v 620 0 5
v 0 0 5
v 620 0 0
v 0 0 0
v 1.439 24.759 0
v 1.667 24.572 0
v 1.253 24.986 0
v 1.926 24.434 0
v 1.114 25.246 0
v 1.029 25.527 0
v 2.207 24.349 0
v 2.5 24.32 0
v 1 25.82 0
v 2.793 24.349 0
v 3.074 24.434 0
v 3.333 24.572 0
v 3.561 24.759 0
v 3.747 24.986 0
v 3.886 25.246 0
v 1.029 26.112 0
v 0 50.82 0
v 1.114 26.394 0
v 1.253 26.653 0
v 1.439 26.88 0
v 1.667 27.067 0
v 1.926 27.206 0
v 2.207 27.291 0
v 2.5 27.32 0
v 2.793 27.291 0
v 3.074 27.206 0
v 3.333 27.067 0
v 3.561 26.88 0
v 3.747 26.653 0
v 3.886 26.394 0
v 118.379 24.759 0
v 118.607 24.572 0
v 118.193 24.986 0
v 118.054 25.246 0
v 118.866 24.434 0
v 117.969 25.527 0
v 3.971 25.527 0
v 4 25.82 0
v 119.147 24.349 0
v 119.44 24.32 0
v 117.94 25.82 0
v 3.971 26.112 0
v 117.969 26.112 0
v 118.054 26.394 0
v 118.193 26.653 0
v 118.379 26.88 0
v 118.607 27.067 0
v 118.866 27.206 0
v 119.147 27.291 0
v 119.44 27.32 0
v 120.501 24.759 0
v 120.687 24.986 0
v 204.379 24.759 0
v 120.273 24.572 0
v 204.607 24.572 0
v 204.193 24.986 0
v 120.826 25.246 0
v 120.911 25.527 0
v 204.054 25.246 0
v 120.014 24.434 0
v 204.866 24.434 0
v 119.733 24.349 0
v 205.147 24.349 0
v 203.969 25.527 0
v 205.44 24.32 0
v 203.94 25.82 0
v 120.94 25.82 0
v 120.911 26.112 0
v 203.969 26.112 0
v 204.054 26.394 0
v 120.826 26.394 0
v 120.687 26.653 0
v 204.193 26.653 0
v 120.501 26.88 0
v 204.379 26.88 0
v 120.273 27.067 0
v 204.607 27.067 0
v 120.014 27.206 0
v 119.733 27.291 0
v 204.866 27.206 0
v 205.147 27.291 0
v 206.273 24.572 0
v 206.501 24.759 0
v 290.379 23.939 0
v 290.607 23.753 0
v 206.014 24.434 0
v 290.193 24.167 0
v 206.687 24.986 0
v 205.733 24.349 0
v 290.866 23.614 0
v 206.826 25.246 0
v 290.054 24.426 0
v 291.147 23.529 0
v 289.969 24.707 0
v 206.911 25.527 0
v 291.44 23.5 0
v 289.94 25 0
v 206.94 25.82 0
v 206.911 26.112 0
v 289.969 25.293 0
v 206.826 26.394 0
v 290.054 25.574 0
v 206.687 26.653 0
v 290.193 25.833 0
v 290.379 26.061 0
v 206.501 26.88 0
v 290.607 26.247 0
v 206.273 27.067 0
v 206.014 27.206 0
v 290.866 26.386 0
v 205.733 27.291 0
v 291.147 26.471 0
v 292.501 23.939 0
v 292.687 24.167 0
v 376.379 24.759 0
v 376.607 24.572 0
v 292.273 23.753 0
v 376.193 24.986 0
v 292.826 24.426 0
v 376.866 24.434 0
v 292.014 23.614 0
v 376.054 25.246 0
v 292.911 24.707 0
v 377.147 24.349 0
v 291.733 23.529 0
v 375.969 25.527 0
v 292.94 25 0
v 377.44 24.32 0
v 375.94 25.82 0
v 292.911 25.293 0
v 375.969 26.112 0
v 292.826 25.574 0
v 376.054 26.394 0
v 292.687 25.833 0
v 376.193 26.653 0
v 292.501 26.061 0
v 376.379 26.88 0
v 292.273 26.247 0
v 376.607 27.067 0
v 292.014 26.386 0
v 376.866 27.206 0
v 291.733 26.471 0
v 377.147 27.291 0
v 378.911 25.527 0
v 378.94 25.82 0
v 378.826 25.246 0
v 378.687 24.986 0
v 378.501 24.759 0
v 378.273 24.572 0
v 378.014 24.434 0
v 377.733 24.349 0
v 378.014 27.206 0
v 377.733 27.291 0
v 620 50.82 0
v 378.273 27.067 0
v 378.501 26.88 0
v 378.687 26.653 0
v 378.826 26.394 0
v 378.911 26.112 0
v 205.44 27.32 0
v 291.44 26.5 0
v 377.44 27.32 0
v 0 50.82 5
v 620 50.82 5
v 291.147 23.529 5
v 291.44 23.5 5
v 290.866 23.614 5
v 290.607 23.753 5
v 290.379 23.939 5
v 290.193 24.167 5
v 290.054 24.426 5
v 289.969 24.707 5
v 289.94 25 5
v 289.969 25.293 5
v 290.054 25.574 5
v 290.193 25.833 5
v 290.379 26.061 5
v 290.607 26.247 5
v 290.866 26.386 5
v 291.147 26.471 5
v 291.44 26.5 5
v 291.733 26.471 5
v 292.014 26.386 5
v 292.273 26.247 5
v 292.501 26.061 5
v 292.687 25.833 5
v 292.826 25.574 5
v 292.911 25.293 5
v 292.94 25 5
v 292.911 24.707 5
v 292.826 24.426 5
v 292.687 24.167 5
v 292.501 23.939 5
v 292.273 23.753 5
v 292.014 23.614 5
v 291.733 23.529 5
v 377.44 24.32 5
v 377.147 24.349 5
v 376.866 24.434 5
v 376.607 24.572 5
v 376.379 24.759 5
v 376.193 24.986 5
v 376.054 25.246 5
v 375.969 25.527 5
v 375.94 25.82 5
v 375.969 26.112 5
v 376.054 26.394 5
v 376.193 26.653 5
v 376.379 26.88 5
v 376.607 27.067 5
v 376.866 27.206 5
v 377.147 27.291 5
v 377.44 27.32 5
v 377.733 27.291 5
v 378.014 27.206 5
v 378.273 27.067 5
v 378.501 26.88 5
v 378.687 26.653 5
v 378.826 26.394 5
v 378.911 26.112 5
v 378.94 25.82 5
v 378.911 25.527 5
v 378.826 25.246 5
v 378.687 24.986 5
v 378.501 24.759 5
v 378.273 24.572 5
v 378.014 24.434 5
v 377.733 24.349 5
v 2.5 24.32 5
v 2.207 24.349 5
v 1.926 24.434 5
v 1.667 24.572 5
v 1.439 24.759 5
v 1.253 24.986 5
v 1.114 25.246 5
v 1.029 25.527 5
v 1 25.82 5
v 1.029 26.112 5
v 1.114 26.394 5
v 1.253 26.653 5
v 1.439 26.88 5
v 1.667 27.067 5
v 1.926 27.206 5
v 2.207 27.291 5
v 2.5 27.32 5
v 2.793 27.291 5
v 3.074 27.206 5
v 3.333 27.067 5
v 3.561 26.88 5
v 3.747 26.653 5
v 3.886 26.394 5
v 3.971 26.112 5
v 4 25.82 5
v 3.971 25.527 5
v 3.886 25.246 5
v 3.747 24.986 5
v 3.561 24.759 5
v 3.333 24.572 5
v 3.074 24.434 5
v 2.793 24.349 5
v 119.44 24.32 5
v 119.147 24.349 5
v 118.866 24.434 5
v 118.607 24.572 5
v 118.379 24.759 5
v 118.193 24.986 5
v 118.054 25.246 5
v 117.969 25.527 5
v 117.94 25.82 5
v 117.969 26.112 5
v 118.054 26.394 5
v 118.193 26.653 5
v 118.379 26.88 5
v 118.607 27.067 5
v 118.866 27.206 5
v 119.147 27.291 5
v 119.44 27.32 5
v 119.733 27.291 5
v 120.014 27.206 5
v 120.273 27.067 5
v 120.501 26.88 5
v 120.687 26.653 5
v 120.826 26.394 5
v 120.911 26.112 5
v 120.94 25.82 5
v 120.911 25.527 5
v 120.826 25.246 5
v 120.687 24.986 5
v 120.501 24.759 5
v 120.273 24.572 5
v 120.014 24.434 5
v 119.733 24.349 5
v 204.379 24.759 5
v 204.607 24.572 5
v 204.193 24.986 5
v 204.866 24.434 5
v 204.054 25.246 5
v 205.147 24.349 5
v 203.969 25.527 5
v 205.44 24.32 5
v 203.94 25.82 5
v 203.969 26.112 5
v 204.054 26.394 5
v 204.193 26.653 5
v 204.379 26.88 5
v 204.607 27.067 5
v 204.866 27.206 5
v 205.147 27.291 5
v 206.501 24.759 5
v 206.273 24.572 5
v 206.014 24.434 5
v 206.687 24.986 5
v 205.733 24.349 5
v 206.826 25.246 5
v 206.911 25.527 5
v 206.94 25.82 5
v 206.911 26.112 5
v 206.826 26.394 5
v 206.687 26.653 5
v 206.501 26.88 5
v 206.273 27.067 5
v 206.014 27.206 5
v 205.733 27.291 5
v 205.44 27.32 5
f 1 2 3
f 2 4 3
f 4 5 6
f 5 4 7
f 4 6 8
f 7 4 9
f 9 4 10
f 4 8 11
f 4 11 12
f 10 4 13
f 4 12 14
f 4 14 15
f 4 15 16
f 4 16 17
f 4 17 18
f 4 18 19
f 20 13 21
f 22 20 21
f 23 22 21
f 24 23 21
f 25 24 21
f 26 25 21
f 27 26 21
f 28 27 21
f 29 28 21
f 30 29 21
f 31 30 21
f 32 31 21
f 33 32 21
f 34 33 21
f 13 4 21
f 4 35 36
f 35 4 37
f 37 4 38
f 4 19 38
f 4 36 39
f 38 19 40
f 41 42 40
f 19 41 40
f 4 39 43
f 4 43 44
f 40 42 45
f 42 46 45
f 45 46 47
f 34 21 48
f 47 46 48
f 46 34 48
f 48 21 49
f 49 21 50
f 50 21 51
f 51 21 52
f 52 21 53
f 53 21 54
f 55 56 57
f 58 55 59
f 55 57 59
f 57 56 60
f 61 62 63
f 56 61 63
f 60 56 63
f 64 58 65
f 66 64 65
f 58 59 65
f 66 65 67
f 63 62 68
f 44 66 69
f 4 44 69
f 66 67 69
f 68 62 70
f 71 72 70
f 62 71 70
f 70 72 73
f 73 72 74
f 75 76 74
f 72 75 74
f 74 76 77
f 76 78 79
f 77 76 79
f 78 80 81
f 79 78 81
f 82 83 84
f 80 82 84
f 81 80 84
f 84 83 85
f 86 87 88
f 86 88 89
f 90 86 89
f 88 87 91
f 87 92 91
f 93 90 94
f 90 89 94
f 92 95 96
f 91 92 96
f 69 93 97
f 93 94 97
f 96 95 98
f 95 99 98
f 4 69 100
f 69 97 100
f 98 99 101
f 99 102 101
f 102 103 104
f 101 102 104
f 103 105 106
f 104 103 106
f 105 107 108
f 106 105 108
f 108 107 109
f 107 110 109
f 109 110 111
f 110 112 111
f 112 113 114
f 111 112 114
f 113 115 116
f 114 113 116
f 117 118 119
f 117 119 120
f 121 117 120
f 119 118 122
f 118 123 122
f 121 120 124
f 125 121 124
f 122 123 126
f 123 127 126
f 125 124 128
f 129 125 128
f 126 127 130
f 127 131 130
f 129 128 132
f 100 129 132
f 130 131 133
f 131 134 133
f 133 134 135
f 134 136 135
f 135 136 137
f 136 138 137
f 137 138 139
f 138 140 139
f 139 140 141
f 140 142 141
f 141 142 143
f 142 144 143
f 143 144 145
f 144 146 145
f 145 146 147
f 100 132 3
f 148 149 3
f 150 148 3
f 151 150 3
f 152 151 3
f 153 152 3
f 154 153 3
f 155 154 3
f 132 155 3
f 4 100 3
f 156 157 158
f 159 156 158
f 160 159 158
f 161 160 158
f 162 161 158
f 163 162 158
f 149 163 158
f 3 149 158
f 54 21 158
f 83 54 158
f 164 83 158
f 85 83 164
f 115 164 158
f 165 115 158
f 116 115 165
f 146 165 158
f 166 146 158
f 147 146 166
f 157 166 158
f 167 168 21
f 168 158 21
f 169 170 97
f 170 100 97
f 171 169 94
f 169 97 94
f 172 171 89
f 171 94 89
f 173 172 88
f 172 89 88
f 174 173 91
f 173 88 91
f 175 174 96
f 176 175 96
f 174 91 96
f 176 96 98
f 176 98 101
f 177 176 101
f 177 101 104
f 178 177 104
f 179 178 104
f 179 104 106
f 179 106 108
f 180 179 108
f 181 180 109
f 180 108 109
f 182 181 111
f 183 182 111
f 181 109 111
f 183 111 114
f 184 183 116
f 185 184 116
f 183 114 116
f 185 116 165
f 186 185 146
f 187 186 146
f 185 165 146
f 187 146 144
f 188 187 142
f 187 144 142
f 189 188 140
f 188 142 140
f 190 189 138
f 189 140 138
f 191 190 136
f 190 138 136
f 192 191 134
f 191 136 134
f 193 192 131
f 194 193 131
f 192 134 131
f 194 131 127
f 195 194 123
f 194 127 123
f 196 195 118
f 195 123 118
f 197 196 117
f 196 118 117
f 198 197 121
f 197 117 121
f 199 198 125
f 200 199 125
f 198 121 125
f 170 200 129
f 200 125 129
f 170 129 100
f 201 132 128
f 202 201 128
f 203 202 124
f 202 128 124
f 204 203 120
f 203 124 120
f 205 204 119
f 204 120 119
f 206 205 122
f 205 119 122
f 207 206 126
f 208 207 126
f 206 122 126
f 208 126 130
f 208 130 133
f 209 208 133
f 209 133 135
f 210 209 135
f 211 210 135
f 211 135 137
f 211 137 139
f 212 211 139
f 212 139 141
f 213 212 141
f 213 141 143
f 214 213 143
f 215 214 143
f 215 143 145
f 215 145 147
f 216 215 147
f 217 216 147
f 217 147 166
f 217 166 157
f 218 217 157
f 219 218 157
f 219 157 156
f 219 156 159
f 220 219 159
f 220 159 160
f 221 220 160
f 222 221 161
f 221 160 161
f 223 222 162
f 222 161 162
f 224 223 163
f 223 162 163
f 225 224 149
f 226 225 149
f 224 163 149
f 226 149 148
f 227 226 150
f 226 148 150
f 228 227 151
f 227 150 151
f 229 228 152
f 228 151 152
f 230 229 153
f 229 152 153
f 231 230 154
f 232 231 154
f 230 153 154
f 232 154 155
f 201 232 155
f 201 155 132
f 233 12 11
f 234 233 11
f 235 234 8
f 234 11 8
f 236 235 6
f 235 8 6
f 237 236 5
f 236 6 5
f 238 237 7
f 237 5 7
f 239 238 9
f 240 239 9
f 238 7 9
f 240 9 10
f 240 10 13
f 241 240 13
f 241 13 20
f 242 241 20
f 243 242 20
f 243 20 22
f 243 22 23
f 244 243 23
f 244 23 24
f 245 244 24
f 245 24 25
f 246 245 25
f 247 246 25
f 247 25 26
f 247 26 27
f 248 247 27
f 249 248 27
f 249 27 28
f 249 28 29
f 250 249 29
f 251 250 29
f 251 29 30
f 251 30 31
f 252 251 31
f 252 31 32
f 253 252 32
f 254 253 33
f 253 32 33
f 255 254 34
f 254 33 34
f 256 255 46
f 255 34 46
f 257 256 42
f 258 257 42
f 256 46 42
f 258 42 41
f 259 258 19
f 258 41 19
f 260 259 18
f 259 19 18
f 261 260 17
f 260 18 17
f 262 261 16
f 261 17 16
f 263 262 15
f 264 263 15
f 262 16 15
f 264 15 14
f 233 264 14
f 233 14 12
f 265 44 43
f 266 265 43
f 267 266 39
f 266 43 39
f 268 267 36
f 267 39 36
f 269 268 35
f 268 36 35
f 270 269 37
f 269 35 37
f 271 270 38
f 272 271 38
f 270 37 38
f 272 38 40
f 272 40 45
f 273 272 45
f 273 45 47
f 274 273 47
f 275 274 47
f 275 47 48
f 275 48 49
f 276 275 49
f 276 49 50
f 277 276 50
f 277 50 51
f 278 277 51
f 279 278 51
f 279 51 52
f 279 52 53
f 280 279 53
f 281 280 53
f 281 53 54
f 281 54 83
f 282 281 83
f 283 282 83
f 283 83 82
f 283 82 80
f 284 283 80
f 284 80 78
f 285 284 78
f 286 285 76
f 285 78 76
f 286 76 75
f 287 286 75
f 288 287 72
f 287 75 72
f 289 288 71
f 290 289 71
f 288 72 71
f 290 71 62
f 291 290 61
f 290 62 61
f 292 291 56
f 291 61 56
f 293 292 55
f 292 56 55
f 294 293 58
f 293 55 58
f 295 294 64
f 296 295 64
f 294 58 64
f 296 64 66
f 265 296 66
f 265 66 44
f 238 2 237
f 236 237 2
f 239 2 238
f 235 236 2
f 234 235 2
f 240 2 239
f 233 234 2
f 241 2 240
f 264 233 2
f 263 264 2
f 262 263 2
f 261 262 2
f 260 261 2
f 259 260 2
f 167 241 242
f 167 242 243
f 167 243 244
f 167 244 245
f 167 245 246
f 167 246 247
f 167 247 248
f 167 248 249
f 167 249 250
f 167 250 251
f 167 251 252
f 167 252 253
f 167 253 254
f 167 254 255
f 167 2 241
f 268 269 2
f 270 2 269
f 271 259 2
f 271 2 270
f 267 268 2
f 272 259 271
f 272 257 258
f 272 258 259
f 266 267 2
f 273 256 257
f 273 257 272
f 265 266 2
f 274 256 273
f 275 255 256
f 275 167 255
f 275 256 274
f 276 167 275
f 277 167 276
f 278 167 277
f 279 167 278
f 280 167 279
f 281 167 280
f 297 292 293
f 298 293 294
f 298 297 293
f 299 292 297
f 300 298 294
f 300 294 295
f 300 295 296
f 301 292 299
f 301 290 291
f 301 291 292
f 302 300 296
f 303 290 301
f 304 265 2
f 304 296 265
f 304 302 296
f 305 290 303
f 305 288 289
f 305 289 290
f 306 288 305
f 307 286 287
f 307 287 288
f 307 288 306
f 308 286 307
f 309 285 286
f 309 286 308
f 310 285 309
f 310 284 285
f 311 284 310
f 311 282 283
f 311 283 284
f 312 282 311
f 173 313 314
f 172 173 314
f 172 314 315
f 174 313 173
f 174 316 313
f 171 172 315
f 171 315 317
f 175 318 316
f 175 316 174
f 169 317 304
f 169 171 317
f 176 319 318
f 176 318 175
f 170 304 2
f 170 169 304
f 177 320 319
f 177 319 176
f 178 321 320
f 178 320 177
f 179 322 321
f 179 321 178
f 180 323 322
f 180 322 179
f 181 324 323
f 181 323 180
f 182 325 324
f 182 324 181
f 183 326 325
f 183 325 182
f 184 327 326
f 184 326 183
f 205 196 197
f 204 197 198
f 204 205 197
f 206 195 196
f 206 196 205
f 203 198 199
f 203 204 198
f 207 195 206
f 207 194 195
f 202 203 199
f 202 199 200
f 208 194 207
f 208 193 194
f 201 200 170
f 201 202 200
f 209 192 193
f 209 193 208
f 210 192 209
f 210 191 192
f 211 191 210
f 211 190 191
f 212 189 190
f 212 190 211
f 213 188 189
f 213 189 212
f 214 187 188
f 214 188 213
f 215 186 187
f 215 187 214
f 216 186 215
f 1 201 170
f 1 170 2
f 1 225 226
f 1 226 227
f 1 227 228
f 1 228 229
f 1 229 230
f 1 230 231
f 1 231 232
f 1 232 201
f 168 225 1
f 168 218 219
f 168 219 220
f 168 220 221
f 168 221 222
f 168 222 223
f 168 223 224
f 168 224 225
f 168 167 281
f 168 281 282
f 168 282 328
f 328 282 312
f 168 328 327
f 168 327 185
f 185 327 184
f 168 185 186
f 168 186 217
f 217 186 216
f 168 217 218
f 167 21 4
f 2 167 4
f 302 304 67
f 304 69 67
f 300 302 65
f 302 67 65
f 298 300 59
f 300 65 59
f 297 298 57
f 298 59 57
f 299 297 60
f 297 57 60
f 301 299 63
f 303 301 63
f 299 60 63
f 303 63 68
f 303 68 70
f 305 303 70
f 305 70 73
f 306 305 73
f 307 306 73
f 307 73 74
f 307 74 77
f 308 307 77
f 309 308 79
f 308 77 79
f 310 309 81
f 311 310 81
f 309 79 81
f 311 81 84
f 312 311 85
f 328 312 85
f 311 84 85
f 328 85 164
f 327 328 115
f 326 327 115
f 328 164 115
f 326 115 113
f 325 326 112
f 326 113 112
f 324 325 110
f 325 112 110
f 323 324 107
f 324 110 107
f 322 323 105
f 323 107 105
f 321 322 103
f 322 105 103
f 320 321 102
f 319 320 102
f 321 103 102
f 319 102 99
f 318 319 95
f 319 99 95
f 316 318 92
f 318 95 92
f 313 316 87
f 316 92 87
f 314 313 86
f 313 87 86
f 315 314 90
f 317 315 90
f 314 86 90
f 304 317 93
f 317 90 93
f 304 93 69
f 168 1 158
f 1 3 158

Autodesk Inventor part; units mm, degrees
ref_plane "YZ Plane" through (0, 0, 0) normal (1, 0, 0) x (0, 1, 0)
ref_plane "XZ Plane" through (0, 0, 0) normal (0, 1, 0) x (-1, 0, 0)
ref_plane "XY Plane" through (0, 0, 0) normal (0, 0, 1) x (1, 0, 0)
sketch "Sketch1" plane through (0, 0, 0) normal (0, 0, 1) x (1, 0, 0)
  line L0 (0, 0) -> (620, 0)
  line L1 (620, 0) -> (620, 50.8197)
  line L2 (620, 50.8197) -> (0, 50.8197)
  line L3 (0, 50.8197) -> (0, 0)
  dimension "d21" = 620
extrude "Extrusion1" add sketch "Sketch1" along normal blind 5
sketch "Sketch2" plane through (0, 0, 5) normal (0, 0, 1) x (1, 0, 0)
  line L0 (0, 50.8197) -> (0, 0) projected
  line L1 (620, 50.8197) -> (0, 50.8197) projected
  line L2 (0, 0) -> (620, 0) projected
  point P0 (2.5, 25.8197)
  point P1 (119.44, 25.8197)
  point P2 (205.44, 25.8197)
  point P3 (291.44, 25)
  point P4 (377.44, 25.8197)
  dimension "d4" = 2.5
  dimension "d5" = 25
  dimension "d6" = 119.44
  dimension "d7" = 25
  dimension "d8" = 205.44
  dimension "d9" = 25
  dimension "d10" = 25
  dimension "d11" = 291.44
  dimension "d12" = 25
  dimension "d13" = 377.44
hole "Hole1" at (2.5, 25.8197, 5) at (119.44, 25.8197, 5) at (205.44, 25.8197, 5) at (291.44, 25, 5) at (377.44, 25.8197, 5) direction (0, 0, -1) diameter 3 end through all
sketch "Sketch3" plane through (0, 0, 5) normal (0, 0, 1) x (1, 0, 0)
  point P0 (0, 0)
properties part number "side_support_holder"
